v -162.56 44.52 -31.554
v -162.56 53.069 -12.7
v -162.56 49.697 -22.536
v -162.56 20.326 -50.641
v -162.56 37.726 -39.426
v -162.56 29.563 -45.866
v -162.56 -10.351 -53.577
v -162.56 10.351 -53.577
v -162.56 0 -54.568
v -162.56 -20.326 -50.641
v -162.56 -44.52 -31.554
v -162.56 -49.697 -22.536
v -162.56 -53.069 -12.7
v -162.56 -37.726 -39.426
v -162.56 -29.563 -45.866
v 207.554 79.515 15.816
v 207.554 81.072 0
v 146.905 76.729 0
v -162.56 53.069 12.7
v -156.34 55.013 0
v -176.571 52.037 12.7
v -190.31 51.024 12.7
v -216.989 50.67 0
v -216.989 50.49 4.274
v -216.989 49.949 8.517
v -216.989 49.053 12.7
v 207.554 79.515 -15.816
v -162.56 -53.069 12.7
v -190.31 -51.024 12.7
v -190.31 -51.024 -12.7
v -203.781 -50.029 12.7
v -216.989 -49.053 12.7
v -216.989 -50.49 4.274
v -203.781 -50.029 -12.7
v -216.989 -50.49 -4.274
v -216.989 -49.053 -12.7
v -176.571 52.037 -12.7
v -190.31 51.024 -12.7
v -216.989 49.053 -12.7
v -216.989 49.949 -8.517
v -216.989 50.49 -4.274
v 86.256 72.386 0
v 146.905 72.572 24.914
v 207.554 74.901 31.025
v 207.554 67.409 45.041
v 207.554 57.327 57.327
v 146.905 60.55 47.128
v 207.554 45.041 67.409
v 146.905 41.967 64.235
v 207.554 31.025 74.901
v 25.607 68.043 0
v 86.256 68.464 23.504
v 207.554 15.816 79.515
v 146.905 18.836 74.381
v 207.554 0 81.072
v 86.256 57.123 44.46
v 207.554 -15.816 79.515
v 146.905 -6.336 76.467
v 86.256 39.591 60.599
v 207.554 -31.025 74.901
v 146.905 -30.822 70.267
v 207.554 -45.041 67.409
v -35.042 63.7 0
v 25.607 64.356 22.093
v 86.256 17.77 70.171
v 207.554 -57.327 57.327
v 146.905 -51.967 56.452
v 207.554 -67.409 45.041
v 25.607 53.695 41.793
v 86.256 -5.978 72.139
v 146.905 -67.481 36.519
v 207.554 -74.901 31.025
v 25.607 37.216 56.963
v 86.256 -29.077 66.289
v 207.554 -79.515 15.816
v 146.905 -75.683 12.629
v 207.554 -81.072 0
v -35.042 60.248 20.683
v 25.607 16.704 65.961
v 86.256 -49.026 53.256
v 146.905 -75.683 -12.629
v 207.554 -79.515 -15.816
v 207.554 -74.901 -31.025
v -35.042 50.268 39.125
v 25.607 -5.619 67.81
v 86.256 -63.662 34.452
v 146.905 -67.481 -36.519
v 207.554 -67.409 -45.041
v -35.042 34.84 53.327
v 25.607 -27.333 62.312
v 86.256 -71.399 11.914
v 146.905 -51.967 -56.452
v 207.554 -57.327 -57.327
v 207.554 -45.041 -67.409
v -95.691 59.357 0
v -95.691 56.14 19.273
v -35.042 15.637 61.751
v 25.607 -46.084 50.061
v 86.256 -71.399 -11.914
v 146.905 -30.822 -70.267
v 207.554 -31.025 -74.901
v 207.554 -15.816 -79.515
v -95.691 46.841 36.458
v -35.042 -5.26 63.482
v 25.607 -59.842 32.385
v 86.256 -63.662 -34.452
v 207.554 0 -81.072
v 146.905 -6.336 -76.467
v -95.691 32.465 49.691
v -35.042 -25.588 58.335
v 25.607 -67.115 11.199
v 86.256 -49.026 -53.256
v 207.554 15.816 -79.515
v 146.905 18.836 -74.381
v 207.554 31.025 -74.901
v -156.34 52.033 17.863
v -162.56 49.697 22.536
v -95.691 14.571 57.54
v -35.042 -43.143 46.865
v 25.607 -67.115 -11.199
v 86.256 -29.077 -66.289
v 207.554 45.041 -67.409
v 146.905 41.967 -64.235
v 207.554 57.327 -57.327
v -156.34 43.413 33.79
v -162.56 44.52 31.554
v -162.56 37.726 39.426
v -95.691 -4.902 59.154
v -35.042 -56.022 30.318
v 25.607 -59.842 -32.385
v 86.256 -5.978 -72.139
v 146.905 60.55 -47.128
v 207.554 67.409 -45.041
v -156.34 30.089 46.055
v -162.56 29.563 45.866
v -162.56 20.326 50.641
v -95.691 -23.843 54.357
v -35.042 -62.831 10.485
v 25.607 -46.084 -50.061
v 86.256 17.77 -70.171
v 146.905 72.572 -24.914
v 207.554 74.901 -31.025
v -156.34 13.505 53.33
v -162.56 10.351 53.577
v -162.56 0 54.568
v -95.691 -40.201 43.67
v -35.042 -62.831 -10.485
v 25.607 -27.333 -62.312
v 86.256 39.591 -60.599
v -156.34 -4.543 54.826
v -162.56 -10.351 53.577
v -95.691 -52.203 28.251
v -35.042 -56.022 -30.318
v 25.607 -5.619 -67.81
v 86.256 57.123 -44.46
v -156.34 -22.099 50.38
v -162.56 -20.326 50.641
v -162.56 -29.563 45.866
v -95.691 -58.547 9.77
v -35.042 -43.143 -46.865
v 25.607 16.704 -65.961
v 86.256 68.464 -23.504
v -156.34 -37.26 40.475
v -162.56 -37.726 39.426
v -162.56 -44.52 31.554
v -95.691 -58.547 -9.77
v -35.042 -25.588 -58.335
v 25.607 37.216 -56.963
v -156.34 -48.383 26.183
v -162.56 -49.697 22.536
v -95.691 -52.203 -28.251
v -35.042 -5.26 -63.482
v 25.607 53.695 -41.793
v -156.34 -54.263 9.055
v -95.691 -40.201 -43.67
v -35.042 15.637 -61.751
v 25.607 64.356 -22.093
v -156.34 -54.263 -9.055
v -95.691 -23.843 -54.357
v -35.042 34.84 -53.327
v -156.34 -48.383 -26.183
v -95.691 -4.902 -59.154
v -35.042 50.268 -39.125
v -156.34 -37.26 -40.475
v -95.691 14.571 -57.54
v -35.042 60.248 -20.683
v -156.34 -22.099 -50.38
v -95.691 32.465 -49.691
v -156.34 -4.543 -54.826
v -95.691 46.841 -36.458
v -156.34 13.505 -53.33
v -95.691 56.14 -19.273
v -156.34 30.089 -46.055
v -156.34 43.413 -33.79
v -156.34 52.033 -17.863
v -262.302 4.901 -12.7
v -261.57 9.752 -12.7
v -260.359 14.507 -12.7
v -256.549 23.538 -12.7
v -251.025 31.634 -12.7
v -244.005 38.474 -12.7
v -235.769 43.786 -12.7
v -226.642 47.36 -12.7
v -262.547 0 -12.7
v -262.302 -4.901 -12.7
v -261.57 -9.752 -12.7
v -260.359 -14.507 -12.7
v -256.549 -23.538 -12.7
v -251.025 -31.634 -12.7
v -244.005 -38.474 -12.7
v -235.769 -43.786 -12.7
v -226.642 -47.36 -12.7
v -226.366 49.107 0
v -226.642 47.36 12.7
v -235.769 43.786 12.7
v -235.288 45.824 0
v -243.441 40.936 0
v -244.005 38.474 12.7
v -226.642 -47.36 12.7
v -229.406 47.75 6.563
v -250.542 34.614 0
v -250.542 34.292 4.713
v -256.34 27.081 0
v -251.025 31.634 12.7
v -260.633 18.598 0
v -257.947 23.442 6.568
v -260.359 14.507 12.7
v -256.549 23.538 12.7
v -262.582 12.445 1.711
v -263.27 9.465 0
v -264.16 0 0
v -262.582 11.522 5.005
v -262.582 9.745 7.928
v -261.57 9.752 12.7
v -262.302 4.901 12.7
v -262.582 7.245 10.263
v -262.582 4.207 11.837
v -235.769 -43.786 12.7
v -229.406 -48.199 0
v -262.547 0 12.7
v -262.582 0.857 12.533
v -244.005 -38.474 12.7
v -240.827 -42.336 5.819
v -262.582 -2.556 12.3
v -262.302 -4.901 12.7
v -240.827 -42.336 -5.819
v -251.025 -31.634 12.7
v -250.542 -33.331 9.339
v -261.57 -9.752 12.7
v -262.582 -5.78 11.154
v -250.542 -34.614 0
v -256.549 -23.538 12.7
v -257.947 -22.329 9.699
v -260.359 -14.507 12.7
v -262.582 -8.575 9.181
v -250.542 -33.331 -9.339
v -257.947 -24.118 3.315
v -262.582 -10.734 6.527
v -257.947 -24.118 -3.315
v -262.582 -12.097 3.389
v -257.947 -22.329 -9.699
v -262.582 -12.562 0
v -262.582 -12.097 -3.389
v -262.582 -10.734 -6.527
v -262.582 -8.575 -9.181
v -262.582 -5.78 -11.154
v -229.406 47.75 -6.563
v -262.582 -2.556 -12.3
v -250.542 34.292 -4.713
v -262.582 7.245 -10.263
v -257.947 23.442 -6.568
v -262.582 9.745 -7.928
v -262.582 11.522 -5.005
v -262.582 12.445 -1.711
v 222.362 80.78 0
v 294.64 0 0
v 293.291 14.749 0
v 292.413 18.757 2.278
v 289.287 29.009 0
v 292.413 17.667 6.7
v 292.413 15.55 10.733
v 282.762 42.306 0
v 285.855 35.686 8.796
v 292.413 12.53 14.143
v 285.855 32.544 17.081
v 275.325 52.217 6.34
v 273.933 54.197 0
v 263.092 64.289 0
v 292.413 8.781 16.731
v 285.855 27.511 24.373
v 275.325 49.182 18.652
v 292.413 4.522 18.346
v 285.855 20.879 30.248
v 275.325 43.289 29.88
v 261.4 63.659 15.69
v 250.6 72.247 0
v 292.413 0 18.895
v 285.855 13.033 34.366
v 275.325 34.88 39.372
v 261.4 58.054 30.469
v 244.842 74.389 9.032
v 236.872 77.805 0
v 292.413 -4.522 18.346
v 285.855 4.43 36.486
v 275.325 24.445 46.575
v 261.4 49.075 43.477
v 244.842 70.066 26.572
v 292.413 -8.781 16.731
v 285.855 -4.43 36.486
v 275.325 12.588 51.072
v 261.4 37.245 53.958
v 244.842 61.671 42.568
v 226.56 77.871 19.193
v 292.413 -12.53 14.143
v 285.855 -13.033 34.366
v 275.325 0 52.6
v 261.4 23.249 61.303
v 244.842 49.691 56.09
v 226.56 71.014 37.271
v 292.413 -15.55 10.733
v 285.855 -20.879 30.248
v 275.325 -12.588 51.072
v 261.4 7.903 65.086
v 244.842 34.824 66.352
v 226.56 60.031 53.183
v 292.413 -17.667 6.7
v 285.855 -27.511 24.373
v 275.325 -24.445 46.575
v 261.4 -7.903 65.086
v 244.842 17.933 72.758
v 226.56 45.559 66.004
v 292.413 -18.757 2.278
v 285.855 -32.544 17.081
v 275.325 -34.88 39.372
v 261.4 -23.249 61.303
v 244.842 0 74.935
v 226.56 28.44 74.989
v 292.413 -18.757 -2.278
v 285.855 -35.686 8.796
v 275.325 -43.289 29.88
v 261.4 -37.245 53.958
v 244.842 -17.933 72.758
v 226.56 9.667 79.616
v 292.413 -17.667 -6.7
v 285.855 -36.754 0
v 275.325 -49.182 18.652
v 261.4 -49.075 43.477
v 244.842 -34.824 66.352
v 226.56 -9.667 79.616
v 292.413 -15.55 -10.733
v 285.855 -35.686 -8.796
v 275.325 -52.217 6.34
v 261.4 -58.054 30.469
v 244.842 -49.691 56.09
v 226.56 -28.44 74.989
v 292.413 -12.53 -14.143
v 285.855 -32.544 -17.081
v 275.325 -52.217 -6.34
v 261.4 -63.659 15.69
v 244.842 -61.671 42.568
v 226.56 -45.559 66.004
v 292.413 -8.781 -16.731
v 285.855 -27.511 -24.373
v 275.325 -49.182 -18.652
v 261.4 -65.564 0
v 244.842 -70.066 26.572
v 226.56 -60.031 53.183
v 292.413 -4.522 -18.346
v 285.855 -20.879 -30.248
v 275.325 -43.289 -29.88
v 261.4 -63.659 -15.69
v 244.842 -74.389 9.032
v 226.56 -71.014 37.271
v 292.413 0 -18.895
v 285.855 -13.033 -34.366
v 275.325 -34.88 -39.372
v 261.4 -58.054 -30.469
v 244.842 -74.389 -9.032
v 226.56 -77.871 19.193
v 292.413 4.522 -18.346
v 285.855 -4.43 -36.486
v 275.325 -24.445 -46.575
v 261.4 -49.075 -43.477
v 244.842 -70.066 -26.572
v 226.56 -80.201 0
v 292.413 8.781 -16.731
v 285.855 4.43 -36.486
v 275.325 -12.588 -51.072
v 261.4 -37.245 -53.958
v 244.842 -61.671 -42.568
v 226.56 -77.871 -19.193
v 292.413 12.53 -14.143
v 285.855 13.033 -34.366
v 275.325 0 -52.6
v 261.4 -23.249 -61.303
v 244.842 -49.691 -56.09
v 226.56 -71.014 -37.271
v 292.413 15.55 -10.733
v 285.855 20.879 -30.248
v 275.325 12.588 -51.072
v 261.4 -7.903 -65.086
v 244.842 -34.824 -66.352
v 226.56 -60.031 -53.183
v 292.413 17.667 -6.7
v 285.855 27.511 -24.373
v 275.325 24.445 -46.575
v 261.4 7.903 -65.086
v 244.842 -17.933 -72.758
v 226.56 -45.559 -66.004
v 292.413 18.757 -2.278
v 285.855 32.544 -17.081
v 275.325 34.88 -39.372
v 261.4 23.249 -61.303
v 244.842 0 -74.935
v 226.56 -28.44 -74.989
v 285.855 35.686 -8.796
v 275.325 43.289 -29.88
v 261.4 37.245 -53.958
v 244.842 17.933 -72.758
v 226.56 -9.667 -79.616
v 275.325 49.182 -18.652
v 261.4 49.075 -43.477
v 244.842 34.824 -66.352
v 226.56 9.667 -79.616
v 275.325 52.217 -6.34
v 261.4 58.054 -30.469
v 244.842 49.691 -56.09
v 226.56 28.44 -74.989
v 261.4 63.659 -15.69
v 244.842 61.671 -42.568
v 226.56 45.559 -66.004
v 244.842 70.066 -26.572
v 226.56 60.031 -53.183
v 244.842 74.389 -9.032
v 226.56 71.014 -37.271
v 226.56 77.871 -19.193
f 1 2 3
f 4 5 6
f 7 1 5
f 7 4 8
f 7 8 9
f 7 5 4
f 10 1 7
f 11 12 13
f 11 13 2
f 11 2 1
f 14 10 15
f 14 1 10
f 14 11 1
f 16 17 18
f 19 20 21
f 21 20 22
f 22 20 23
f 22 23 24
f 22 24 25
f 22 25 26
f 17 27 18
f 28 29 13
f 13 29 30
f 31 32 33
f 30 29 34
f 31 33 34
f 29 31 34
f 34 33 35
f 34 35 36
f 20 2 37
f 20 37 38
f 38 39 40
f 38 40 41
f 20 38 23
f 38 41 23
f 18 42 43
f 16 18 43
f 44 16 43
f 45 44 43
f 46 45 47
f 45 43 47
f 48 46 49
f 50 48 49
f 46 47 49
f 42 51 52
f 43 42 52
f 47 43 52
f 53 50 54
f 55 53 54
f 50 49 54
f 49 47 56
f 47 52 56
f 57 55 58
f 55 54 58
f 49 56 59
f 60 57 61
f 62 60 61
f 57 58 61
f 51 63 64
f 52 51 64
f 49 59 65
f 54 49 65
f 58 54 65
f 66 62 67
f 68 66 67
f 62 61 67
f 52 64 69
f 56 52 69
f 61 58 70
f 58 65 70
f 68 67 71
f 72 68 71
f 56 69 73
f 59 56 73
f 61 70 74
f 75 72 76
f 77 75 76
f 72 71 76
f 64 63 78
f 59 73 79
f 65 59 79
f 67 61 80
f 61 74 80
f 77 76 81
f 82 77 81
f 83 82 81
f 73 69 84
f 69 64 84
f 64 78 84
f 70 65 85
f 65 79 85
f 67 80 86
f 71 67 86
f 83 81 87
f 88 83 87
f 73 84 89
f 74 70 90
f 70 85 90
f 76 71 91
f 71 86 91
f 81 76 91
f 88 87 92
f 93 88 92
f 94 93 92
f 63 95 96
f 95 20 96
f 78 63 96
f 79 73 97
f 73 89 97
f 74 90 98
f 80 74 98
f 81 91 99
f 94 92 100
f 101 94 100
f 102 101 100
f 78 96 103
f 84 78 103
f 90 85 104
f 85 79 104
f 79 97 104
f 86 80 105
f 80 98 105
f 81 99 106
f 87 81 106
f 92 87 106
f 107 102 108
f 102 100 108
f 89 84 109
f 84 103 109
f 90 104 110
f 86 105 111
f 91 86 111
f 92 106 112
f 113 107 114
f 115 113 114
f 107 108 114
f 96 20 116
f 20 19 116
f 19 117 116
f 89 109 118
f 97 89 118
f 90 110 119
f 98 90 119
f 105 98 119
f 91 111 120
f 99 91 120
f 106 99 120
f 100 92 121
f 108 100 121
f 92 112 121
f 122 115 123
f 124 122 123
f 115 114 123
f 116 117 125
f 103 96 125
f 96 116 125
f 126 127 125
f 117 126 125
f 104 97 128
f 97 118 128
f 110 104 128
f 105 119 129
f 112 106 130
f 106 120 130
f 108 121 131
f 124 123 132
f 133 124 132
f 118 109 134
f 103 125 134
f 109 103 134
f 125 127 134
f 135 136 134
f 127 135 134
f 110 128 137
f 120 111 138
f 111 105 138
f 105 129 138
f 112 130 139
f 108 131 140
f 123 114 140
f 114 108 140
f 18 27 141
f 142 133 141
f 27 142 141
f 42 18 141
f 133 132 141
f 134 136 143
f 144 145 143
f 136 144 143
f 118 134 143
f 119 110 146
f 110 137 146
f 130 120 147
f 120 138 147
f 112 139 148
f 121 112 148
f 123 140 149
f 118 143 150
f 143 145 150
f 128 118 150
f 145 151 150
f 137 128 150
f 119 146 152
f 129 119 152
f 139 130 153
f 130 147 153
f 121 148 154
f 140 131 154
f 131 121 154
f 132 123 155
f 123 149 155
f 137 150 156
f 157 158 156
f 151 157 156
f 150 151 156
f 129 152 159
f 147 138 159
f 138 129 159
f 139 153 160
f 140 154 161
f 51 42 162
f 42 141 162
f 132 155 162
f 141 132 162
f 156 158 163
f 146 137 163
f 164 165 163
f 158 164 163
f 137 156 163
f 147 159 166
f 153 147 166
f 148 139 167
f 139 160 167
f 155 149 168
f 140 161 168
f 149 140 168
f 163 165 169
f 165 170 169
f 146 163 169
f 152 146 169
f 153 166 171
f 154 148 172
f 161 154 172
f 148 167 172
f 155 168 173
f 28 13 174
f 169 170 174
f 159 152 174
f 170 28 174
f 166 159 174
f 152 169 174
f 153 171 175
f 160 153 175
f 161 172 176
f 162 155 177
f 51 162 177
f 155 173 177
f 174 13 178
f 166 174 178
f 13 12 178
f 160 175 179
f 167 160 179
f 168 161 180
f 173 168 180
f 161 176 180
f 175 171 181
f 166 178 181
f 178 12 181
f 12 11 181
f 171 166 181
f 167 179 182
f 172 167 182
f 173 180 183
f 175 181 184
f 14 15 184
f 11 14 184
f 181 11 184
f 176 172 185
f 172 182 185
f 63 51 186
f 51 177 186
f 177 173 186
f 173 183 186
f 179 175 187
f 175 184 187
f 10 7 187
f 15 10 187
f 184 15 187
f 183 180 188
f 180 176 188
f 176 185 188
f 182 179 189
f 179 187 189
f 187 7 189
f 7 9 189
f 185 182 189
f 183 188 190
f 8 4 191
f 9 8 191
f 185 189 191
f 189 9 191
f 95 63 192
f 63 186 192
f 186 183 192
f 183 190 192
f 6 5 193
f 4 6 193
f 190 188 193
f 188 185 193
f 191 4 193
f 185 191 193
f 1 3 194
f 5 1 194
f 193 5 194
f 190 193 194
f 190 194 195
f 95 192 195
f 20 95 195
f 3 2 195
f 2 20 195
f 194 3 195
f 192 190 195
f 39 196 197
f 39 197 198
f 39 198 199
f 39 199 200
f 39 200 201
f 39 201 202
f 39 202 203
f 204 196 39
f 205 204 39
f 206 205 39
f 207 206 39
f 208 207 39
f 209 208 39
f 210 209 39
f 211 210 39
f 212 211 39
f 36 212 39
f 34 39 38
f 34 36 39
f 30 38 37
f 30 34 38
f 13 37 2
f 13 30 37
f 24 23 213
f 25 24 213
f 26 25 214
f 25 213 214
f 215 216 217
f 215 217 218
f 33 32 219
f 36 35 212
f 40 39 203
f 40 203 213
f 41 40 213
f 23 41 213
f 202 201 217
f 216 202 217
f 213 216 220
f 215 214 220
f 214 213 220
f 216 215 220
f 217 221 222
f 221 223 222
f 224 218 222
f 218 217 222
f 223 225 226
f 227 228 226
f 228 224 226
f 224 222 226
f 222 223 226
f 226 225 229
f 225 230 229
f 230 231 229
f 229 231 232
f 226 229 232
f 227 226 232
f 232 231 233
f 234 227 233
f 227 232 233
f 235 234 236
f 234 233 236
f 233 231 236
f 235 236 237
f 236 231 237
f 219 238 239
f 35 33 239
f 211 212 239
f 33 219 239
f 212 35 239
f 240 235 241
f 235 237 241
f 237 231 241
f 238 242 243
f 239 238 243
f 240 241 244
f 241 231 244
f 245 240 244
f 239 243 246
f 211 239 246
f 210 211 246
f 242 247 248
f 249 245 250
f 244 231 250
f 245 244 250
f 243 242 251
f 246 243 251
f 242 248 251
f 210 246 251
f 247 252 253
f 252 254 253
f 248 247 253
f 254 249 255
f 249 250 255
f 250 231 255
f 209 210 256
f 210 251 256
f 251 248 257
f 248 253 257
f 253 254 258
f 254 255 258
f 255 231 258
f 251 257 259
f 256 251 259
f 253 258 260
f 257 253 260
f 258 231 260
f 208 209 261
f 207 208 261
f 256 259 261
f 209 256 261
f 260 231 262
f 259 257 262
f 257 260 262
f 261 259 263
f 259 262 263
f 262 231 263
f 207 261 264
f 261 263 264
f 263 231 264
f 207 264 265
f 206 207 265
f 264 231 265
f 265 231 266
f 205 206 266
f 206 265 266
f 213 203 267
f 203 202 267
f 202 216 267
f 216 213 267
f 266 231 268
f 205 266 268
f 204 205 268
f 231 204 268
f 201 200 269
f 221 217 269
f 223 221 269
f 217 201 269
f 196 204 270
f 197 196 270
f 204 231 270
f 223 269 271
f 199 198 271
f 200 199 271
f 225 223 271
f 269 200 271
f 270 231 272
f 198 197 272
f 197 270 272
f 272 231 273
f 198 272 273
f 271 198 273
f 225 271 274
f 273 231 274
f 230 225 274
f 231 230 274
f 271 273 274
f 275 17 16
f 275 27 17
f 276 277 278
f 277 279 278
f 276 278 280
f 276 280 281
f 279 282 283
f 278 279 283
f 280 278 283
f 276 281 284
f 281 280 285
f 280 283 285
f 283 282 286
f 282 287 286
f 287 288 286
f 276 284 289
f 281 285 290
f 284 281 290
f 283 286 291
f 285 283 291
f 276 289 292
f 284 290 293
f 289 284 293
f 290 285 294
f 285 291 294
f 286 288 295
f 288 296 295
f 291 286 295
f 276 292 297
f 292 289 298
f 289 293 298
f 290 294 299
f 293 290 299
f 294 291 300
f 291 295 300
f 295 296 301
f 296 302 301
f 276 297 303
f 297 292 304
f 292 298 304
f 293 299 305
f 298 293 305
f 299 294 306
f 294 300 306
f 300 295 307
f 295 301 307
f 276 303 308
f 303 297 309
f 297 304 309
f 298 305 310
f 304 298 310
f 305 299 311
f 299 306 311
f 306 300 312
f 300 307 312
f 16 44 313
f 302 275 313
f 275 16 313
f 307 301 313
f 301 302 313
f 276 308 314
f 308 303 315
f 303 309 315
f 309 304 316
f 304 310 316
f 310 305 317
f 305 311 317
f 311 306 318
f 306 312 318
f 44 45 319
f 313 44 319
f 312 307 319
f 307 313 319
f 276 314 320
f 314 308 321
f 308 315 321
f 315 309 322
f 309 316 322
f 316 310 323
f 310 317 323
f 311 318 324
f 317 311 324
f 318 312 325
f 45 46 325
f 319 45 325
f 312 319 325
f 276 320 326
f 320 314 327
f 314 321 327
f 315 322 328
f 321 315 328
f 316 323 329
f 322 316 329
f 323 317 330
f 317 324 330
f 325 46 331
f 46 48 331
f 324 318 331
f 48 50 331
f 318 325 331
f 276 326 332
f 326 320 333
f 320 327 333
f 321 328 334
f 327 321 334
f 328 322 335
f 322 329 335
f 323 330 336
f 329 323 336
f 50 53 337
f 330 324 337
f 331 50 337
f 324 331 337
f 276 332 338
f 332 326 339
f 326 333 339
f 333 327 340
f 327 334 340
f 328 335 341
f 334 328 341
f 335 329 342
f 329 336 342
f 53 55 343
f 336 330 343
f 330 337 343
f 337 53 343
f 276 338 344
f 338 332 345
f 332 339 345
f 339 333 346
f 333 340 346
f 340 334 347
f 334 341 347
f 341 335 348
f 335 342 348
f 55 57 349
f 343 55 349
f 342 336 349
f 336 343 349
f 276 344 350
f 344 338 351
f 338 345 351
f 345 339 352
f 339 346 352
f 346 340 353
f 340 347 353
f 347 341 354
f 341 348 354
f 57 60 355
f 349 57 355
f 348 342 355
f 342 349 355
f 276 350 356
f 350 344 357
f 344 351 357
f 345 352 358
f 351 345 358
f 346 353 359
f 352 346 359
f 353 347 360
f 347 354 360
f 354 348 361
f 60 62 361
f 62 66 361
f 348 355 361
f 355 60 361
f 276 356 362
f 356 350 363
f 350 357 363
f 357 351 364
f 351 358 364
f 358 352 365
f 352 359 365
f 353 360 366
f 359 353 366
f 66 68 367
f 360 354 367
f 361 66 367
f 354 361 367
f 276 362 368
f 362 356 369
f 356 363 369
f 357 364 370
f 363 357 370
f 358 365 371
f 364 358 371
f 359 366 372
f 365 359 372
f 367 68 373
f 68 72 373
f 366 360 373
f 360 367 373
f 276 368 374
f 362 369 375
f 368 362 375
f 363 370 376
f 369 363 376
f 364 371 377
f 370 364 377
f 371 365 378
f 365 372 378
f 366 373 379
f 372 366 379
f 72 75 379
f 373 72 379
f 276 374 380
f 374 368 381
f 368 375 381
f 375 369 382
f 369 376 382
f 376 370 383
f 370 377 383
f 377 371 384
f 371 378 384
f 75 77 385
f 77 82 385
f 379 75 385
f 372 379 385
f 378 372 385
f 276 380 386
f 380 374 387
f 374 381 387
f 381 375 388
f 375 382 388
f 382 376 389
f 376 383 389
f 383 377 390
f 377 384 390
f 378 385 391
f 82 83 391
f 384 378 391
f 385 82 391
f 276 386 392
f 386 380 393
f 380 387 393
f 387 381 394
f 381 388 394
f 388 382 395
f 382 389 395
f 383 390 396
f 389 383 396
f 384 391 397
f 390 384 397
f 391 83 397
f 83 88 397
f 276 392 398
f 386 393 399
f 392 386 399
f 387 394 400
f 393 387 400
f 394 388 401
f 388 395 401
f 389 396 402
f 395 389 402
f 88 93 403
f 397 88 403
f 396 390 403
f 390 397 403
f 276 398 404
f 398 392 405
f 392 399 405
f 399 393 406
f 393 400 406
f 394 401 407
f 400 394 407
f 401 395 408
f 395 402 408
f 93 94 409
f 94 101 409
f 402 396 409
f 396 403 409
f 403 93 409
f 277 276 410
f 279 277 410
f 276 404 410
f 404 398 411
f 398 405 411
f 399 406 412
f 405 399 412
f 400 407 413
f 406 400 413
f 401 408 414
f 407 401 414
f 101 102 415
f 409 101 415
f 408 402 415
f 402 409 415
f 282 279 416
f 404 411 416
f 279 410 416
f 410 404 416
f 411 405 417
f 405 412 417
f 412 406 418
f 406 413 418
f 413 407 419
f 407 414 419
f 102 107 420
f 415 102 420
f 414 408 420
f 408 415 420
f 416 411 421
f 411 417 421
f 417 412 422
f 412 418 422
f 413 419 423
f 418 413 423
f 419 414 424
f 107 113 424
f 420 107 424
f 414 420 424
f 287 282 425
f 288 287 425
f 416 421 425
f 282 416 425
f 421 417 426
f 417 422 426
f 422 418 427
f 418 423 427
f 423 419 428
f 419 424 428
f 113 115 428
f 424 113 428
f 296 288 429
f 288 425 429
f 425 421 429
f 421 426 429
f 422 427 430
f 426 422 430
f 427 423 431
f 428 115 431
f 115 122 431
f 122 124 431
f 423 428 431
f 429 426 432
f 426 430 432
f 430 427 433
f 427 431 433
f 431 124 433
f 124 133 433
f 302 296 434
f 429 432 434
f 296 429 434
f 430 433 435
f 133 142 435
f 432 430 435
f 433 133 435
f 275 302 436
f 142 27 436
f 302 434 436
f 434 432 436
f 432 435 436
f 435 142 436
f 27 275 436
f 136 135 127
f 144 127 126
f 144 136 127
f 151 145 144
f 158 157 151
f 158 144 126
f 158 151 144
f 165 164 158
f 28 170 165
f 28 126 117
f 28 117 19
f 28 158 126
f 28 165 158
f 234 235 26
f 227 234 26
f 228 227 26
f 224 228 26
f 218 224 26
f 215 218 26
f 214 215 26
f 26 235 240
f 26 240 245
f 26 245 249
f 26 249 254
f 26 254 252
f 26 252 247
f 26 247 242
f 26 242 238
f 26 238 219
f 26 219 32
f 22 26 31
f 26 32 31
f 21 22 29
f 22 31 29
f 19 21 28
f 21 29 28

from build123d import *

# Parameters (mm, degrees)
CUT_EXTRUDE2_DEPTH      = 157.48
CUT_EXTRUDE2_DEPTH_BACK = 157.48
SKETCH2_W               = 101.6
SKETCH2_H               = 127


with BuildPart() as part:
    # Sketch1 → Revolve1 (revolve)
    with BuildSketch(Plane.XY):
        with BuildLine():
            Line((-213.36, 0), (213.36, 0))
            Line((213.36, 0), (294.64, 0))
            ThreePointArc((294.64, 0), (268.742984494, 59.490868447), (207.554285714, 81.072387911))
            Line((207.554285714, 81.072387911), (-216.988571429, 50.670242445))
            ThreePointArc((-216.988571429, 50.670242445), (-250.541792779, 34.614365309), (-264.16, 0))
            Line((-264.16, 0), (-213.36, 0))
        make_face()
    revolve(axis=Axis((-213.36, 0, 0), (1, 0, 0)))

    # Sketch2 → Cut-Extrude2 (cut, two sides: drawn at the far end of the back side and taken through both)
    with BuildSketch(Plane(origin=(0, 0, 0), x_dir=(1, 0, 0), z_dir=(0, 1, 0)).offset(-CUT_EXTRUDE2_DEPTH_BACK)):
        with Locations((-213.36, 76.2)):
            Rectangle(SKETCH2_W, SKETCH2_H)
        with Locations((-213.36, -76.2)):
            Rectangle(SKETCH2_W, SKETCH2_H)
    extrude(amount=CUT_EXTRUDE2_DEPTH + CUT_EXTRUDE2_DEPTH_BACK, mode=Mode.SUBTRACT)


solid = part.part
